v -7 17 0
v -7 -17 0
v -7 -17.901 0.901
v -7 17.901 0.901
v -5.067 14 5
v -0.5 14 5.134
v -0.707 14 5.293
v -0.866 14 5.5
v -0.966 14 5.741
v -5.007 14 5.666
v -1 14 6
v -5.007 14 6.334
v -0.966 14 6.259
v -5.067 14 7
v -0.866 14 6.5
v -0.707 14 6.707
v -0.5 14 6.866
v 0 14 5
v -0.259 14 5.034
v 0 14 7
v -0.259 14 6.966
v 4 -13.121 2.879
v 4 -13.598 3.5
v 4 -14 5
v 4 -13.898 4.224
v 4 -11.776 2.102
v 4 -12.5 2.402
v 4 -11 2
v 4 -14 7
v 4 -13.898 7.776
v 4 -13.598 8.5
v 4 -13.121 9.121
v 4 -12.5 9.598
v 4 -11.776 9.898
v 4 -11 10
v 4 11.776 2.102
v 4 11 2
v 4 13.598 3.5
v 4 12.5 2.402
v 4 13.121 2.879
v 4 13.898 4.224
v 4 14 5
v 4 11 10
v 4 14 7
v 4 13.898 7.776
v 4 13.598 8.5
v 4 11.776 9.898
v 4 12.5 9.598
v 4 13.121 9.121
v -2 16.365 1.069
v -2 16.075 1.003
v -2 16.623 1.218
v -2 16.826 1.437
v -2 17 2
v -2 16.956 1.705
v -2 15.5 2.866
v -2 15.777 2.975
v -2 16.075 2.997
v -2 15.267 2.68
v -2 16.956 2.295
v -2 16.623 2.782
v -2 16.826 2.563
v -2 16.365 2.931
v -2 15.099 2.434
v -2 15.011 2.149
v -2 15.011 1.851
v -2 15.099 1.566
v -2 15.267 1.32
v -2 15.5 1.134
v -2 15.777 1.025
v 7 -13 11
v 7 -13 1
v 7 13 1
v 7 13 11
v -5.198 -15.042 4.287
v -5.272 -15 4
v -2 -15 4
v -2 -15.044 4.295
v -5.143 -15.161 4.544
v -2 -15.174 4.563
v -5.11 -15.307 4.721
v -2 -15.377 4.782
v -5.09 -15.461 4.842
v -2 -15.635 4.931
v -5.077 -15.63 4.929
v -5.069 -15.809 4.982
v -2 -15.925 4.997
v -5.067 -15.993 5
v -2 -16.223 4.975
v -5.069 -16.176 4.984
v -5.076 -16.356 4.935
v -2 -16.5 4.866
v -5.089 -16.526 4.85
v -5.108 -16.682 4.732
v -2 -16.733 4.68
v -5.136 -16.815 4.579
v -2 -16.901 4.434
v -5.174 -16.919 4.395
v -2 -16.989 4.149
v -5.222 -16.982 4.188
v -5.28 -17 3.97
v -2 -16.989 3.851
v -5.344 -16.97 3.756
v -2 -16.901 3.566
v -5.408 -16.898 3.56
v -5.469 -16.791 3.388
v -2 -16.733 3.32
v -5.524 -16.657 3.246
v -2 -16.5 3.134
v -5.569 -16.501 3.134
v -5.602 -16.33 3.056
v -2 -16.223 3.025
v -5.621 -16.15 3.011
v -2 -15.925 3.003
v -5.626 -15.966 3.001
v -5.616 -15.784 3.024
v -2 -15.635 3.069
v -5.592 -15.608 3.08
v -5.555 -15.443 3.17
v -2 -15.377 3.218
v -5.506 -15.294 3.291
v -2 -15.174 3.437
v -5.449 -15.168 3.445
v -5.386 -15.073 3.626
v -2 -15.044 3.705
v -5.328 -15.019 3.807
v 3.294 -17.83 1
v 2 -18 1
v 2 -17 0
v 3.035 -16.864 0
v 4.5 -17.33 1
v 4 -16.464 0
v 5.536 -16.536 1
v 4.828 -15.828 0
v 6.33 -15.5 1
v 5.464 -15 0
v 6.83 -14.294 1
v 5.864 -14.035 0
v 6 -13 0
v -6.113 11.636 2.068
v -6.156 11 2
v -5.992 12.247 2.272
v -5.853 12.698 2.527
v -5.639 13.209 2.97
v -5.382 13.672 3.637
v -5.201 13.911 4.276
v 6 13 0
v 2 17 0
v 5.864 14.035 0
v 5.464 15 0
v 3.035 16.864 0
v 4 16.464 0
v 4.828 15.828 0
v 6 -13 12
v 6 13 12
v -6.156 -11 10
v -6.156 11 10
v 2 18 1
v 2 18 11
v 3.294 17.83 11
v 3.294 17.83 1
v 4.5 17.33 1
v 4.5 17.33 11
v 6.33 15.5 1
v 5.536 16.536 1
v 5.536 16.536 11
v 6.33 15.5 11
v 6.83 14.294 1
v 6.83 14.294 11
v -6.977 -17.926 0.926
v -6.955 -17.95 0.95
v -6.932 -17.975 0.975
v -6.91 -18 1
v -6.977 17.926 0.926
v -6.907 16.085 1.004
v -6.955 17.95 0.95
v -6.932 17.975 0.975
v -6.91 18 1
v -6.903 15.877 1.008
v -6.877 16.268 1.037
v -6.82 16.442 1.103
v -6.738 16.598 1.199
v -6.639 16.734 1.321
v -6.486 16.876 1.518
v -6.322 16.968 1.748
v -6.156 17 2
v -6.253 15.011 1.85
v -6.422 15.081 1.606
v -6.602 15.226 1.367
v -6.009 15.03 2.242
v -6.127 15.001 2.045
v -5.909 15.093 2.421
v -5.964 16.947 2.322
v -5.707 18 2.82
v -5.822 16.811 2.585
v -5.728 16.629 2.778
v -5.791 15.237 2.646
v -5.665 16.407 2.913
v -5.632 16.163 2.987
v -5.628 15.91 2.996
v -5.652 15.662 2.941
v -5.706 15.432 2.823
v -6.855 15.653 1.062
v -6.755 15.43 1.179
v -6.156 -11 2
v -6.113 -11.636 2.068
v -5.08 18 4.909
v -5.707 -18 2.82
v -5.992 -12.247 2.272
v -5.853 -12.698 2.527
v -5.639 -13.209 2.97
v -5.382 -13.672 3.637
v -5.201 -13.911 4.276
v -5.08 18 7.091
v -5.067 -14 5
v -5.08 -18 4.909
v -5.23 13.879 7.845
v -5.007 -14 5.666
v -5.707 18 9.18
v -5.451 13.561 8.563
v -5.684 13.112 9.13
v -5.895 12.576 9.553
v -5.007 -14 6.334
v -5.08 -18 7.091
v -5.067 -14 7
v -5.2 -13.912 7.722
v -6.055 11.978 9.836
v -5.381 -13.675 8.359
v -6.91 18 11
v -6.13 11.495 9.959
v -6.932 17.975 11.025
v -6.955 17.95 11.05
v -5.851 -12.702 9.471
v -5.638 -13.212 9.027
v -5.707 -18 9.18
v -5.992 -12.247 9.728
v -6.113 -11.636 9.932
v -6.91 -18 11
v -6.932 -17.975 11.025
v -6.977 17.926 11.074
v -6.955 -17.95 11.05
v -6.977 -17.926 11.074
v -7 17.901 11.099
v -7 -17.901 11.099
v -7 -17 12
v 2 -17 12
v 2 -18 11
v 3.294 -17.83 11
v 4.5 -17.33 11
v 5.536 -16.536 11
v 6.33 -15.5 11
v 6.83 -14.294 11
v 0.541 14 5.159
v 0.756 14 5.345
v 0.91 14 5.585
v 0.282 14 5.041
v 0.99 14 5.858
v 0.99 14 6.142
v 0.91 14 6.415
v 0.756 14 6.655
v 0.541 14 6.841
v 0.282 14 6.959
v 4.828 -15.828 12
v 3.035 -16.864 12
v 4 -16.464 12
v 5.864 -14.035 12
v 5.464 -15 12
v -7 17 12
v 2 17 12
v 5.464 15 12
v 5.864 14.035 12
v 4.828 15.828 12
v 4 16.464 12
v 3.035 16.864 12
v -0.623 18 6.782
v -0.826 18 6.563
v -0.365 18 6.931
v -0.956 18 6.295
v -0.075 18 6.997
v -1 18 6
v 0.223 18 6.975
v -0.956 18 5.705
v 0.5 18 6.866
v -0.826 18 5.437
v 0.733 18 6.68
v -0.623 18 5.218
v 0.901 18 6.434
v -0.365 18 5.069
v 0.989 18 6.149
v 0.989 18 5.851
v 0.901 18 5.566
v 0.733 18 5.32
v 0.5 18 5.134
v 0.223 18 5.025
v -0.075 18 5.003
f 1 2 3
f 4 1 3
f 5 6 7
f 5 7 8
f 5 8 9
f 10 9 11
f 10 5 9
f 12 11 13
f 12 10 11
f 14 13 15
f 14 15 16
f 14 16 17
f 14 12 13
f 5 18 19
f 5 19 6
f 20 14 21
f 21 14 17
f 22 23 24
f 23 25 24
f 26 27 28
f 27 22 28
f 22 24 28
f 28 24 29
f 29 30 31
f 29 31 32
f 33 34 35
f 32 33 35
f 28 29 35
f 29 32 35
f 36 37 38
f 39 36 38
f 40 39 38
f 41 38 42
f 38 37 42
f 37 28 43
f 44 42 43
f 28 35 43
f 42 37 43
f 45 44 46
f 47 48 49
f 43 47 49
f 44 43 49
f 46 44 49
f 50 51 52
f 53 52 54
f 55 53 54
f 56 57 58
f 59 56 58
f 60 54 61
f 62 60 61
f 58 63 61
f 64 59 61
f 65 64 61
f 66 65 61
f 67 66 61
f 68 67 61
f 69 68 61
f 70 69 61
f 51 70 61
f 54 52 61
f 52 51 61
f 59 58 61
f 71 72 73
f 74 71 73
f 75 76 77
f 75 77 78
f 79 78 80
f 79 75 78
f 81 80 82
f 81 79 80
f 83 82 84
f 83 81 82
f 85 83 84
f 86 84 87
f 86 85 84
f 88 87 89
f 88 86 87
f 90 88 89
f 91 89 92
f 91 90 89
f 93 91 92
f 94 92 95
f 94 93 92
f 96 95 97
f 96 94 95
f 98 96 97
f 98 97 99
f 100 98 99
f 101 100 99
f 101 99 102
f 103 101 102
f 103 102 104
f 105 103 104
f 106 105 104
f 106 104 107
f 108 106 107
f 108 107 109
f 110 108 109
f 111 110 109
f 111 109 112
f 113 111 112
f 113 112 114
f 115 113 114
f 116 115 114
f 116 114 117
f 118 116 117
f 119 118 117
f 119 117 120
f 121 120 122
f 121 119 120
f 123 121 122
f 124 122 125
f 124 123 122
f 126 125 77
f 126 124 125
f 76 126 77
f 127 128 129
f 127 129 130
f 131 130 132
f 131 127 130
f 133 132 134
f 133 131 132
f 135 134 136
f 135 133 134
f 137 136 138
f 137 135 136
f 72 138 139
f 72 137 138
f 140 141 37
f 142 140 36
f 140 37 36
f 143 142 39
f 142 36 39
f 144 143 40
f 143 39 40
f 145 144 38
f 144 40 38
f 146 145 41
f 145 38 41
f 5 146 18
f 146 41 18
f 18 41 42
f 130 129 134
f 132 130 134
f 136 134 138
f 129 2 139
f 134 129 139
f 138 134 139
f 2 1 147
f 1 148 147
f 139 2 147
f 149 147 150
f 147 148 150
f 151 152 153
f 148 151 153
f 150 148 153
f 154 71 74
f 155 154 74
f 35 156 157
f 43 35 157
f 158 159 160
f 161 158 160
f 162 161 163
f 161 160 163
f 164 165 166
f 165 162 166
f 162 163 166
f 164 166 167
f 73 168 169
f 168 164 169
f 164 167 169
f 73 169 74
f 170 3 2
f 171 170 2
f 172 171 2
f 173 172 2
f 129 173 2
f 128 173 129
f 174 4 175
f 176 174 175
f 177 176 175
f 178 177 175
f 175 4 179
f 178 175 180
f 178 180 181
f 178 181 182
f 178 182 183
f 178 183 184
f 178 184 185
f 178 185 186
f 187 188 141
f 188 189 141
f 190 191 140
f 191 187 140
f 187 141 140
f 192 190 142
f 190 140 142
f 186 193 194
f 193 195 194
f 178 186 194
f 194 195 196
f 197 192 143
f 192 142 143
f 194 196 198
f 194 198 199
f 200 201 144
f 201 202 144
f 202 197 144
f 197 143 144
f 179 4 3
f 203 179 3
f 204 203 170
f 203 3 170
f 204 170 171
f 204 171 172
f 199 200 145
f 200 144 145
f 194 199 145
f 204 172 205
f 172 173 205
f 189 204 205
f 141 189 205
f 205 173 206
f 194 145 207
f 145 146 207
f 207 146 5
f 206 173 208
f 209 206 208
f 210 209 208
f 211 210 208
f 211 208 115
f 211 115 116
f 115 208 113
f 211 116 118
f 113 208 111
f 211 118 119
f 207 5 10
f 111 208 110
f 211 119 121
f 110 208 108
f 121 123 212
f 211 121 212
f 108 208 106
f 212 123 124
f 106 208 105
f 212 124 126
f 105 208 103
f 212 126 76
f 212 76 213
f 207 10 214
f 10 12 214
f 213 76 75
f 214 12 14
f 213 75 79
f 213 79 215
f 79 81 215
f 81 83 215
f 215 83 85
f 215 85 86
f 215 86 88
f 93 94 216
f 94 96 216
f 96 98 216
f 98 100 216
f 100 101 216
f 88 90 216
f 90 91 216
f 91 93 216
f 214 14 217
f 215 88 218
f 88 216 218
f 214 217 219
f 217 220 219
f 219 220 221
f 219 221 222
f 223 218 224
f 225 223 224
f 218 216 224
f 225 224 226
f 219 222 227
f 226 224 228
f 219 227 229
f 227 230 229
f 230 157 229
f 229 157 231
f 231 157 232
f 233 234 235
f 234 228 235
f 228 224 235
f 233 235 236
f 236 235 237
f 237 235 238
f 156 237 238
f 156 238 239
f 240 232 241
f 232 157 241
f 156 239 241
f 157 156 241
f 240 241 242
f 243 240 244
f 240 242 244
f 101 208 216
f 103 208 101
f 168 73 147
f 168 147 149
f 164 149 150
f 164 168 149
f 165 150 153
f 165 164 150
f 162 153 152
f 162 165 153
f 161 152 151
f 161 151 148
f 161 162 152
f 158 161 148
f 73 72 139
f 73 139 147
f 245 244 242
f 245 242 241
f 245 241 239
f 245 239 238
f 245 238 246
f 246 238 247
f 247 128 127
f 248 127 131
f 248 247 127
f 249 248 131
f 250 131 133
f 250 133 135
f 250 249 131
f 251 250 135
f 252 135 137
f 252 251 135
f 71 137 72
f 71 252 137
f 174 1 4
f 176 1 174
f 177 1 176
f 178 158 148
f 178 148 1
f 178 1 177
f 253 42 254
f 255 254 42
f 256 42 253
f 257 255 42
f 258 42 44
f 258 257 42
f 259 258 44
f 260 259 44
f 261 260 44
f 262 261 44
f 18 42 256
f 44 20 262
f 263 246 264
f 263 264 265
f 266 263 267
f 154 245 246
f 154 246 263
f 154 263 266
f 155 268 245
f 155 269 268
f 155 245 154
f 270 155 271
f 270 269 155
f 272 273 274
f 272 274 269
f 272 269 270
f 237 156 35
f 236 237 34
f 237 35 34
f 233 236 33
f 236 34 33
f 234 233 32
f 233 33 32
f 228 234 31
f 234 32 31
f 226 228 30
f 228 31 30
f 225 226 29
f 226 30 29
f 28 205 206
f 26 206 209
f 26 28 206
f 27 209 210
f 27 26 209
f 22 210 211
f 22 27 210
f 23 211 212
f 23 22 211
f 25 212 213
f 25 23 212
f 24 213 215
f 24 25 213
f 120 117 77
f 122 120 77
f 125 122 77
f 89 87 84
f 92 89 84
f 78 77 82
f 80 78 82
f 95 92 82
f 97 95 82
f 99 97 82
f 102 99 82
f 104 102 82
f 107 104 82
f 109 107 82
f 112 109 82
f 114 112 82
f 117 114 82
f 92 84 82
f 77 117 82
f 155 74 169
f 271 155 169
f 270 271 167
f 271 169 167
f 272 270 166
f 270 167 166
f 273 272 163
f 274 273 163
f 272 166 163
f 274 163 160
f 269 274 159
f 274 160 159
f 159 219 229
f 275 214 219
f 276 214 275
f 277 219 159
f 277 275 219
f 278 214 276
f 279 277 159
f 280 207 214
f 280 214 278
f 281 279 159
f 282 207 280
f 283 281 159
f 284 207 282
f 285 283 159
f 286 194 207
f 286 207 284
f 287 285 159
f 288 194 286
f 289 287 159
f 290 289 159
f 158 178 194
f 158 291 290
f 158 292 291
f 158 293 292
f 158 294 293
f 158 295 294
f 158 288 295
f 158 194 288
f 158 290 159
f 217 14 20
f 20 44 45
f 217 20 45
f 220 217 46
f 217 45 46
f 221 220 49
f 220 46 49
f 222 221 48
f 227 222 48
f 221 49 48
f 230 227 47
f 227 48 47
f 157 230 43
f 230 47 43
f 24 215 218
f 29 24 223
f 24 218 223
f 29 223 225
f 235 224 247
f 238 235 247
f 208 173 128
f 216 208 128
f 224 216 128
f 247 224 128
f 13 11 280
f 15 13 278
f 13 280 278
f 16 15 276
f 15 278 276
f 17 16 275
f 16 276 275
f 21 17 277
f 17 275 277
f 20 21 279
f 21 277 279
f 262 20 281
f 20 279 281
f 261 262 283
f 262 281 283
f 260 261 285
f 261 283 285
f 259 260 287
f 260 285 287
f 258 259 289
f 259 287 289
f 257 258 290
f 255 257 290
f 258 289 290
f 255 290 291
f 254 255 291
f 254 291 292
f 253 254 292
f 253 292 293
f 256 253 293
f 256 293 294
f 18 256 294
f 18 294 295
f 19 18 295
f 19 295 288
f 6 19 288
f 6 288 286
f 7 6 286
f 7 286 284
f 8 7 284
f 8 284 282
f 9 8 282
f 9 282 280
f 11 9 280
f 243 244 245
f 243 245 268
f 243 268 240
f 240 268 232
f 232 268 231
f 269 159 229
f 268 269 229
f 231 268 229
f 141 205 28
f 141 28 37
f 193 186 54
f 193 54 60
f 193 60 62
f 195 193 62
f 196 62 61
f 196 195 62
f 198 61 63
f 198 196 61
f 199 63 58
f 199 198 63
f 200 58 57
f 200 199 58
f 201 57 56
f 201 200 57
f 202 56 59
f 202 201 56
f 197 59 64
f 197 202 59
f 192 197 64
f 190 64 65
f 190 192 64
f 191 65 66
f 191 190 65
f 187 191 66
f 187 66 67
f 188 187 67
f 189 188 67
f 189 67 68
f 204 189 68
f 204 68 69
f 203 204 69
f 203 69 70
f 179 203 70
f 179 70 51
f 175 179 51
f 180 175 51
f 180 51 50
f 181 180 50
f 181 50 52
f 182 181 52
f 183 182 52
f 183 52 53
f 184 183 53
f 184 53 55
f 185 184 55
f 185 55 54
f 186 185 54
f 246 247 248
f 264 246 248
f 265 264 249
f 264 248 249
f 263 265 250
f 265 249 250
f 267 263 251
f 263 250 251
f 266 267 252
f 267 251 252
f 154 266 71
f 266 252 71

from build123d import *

# Parameters (mm, degrees)
F0_W      = 14
F0_H      = 36
F1_DEPTH  = 12
F2_R      = 7.5
F3_DEPTH  = 36.001
F5_W      = 28
F5_H      = 8
F6_DEPTH  = 11
F7_R      = 3
F8_R      = 5
F9_SIZE   = 1
F10_R     = 1
F11_DEPTH = 4
F12_R     = 1
F13_DEPTH = 5


with BuildPart() as f1:
    # F0 (on Top) → F1 (new body)
    with BuildSketch(Plane.XY):
        Rectangle(F0_W, F0_H)
    extrude(amount=F1_DEPTH)

    # F2 (on face) → F3 (cut, through all)
    with BuildSketch(Plane.XZ.offset(18)):
        with Locations((-12.5, 6)):
            Circle(F2_R)
    extrude(amount=-F3_DEPTH, mode=Mode.SUBTRACT)

    # F5 (on offset) → F6 (cut)
    with BuildSketch(Plane.YZ.offset(-7)):
        with Locations((0, 6)):
            Rectangle(F5_W, F5_H)
    extrude(amount=F6_DEPTH, mode=Mode.SUBTRACT)

    # F7
    f7_edges = [f1.edges().sort_by_distance(p)[0] for p in [
        (-1.077856, 14, 2),
        (-1.077856, -14, 10),
        (-1.077856, -14, 2),
        (-1.077856, 14, 10),
    ]]
    fillet(f7_edges, radius=F7_R)

    # F8
    f8_edges = [f1.edges().sort_by_distance(p)[0] for p in [
        (7, -18, 6),
        (7, 18, 6),
    ]]
    fillet(f8_edges, radius=F8_R)

    # F9
    f9_edges = [f1.edges().sort_by_distance(p)[0] for p in [
        (-2.5, -18, 0),
        (-2.5, -18, 12),
    ]]
    chamfer(f9_edges, length=F9_SIZE)

    # F10 (on face) → F11 (cut, through all)
    with BuildSketch(Plane(origin=(0, 18, 0), x_dir=(-1, 0, 0), z_dir=(0, 1, 0))):
        with Locations((0, 6)):
            Circle(F10_R)
    extrude(amount=-F11_DEPTH, mode=Mode.SUBTRACT)

    # F12 (on offset) → F13 (cut)
    with BuildSketch(Plane.YZ.offset(-7)):
        with Locations((-16, 4)):
            Circle(F12_R)
        with Locations((16, 2)):
            Circle(F12_R)
    extrude(amount=F13_DEPTH, mode=Mode.SUBTRACT)


solid = f1.part
